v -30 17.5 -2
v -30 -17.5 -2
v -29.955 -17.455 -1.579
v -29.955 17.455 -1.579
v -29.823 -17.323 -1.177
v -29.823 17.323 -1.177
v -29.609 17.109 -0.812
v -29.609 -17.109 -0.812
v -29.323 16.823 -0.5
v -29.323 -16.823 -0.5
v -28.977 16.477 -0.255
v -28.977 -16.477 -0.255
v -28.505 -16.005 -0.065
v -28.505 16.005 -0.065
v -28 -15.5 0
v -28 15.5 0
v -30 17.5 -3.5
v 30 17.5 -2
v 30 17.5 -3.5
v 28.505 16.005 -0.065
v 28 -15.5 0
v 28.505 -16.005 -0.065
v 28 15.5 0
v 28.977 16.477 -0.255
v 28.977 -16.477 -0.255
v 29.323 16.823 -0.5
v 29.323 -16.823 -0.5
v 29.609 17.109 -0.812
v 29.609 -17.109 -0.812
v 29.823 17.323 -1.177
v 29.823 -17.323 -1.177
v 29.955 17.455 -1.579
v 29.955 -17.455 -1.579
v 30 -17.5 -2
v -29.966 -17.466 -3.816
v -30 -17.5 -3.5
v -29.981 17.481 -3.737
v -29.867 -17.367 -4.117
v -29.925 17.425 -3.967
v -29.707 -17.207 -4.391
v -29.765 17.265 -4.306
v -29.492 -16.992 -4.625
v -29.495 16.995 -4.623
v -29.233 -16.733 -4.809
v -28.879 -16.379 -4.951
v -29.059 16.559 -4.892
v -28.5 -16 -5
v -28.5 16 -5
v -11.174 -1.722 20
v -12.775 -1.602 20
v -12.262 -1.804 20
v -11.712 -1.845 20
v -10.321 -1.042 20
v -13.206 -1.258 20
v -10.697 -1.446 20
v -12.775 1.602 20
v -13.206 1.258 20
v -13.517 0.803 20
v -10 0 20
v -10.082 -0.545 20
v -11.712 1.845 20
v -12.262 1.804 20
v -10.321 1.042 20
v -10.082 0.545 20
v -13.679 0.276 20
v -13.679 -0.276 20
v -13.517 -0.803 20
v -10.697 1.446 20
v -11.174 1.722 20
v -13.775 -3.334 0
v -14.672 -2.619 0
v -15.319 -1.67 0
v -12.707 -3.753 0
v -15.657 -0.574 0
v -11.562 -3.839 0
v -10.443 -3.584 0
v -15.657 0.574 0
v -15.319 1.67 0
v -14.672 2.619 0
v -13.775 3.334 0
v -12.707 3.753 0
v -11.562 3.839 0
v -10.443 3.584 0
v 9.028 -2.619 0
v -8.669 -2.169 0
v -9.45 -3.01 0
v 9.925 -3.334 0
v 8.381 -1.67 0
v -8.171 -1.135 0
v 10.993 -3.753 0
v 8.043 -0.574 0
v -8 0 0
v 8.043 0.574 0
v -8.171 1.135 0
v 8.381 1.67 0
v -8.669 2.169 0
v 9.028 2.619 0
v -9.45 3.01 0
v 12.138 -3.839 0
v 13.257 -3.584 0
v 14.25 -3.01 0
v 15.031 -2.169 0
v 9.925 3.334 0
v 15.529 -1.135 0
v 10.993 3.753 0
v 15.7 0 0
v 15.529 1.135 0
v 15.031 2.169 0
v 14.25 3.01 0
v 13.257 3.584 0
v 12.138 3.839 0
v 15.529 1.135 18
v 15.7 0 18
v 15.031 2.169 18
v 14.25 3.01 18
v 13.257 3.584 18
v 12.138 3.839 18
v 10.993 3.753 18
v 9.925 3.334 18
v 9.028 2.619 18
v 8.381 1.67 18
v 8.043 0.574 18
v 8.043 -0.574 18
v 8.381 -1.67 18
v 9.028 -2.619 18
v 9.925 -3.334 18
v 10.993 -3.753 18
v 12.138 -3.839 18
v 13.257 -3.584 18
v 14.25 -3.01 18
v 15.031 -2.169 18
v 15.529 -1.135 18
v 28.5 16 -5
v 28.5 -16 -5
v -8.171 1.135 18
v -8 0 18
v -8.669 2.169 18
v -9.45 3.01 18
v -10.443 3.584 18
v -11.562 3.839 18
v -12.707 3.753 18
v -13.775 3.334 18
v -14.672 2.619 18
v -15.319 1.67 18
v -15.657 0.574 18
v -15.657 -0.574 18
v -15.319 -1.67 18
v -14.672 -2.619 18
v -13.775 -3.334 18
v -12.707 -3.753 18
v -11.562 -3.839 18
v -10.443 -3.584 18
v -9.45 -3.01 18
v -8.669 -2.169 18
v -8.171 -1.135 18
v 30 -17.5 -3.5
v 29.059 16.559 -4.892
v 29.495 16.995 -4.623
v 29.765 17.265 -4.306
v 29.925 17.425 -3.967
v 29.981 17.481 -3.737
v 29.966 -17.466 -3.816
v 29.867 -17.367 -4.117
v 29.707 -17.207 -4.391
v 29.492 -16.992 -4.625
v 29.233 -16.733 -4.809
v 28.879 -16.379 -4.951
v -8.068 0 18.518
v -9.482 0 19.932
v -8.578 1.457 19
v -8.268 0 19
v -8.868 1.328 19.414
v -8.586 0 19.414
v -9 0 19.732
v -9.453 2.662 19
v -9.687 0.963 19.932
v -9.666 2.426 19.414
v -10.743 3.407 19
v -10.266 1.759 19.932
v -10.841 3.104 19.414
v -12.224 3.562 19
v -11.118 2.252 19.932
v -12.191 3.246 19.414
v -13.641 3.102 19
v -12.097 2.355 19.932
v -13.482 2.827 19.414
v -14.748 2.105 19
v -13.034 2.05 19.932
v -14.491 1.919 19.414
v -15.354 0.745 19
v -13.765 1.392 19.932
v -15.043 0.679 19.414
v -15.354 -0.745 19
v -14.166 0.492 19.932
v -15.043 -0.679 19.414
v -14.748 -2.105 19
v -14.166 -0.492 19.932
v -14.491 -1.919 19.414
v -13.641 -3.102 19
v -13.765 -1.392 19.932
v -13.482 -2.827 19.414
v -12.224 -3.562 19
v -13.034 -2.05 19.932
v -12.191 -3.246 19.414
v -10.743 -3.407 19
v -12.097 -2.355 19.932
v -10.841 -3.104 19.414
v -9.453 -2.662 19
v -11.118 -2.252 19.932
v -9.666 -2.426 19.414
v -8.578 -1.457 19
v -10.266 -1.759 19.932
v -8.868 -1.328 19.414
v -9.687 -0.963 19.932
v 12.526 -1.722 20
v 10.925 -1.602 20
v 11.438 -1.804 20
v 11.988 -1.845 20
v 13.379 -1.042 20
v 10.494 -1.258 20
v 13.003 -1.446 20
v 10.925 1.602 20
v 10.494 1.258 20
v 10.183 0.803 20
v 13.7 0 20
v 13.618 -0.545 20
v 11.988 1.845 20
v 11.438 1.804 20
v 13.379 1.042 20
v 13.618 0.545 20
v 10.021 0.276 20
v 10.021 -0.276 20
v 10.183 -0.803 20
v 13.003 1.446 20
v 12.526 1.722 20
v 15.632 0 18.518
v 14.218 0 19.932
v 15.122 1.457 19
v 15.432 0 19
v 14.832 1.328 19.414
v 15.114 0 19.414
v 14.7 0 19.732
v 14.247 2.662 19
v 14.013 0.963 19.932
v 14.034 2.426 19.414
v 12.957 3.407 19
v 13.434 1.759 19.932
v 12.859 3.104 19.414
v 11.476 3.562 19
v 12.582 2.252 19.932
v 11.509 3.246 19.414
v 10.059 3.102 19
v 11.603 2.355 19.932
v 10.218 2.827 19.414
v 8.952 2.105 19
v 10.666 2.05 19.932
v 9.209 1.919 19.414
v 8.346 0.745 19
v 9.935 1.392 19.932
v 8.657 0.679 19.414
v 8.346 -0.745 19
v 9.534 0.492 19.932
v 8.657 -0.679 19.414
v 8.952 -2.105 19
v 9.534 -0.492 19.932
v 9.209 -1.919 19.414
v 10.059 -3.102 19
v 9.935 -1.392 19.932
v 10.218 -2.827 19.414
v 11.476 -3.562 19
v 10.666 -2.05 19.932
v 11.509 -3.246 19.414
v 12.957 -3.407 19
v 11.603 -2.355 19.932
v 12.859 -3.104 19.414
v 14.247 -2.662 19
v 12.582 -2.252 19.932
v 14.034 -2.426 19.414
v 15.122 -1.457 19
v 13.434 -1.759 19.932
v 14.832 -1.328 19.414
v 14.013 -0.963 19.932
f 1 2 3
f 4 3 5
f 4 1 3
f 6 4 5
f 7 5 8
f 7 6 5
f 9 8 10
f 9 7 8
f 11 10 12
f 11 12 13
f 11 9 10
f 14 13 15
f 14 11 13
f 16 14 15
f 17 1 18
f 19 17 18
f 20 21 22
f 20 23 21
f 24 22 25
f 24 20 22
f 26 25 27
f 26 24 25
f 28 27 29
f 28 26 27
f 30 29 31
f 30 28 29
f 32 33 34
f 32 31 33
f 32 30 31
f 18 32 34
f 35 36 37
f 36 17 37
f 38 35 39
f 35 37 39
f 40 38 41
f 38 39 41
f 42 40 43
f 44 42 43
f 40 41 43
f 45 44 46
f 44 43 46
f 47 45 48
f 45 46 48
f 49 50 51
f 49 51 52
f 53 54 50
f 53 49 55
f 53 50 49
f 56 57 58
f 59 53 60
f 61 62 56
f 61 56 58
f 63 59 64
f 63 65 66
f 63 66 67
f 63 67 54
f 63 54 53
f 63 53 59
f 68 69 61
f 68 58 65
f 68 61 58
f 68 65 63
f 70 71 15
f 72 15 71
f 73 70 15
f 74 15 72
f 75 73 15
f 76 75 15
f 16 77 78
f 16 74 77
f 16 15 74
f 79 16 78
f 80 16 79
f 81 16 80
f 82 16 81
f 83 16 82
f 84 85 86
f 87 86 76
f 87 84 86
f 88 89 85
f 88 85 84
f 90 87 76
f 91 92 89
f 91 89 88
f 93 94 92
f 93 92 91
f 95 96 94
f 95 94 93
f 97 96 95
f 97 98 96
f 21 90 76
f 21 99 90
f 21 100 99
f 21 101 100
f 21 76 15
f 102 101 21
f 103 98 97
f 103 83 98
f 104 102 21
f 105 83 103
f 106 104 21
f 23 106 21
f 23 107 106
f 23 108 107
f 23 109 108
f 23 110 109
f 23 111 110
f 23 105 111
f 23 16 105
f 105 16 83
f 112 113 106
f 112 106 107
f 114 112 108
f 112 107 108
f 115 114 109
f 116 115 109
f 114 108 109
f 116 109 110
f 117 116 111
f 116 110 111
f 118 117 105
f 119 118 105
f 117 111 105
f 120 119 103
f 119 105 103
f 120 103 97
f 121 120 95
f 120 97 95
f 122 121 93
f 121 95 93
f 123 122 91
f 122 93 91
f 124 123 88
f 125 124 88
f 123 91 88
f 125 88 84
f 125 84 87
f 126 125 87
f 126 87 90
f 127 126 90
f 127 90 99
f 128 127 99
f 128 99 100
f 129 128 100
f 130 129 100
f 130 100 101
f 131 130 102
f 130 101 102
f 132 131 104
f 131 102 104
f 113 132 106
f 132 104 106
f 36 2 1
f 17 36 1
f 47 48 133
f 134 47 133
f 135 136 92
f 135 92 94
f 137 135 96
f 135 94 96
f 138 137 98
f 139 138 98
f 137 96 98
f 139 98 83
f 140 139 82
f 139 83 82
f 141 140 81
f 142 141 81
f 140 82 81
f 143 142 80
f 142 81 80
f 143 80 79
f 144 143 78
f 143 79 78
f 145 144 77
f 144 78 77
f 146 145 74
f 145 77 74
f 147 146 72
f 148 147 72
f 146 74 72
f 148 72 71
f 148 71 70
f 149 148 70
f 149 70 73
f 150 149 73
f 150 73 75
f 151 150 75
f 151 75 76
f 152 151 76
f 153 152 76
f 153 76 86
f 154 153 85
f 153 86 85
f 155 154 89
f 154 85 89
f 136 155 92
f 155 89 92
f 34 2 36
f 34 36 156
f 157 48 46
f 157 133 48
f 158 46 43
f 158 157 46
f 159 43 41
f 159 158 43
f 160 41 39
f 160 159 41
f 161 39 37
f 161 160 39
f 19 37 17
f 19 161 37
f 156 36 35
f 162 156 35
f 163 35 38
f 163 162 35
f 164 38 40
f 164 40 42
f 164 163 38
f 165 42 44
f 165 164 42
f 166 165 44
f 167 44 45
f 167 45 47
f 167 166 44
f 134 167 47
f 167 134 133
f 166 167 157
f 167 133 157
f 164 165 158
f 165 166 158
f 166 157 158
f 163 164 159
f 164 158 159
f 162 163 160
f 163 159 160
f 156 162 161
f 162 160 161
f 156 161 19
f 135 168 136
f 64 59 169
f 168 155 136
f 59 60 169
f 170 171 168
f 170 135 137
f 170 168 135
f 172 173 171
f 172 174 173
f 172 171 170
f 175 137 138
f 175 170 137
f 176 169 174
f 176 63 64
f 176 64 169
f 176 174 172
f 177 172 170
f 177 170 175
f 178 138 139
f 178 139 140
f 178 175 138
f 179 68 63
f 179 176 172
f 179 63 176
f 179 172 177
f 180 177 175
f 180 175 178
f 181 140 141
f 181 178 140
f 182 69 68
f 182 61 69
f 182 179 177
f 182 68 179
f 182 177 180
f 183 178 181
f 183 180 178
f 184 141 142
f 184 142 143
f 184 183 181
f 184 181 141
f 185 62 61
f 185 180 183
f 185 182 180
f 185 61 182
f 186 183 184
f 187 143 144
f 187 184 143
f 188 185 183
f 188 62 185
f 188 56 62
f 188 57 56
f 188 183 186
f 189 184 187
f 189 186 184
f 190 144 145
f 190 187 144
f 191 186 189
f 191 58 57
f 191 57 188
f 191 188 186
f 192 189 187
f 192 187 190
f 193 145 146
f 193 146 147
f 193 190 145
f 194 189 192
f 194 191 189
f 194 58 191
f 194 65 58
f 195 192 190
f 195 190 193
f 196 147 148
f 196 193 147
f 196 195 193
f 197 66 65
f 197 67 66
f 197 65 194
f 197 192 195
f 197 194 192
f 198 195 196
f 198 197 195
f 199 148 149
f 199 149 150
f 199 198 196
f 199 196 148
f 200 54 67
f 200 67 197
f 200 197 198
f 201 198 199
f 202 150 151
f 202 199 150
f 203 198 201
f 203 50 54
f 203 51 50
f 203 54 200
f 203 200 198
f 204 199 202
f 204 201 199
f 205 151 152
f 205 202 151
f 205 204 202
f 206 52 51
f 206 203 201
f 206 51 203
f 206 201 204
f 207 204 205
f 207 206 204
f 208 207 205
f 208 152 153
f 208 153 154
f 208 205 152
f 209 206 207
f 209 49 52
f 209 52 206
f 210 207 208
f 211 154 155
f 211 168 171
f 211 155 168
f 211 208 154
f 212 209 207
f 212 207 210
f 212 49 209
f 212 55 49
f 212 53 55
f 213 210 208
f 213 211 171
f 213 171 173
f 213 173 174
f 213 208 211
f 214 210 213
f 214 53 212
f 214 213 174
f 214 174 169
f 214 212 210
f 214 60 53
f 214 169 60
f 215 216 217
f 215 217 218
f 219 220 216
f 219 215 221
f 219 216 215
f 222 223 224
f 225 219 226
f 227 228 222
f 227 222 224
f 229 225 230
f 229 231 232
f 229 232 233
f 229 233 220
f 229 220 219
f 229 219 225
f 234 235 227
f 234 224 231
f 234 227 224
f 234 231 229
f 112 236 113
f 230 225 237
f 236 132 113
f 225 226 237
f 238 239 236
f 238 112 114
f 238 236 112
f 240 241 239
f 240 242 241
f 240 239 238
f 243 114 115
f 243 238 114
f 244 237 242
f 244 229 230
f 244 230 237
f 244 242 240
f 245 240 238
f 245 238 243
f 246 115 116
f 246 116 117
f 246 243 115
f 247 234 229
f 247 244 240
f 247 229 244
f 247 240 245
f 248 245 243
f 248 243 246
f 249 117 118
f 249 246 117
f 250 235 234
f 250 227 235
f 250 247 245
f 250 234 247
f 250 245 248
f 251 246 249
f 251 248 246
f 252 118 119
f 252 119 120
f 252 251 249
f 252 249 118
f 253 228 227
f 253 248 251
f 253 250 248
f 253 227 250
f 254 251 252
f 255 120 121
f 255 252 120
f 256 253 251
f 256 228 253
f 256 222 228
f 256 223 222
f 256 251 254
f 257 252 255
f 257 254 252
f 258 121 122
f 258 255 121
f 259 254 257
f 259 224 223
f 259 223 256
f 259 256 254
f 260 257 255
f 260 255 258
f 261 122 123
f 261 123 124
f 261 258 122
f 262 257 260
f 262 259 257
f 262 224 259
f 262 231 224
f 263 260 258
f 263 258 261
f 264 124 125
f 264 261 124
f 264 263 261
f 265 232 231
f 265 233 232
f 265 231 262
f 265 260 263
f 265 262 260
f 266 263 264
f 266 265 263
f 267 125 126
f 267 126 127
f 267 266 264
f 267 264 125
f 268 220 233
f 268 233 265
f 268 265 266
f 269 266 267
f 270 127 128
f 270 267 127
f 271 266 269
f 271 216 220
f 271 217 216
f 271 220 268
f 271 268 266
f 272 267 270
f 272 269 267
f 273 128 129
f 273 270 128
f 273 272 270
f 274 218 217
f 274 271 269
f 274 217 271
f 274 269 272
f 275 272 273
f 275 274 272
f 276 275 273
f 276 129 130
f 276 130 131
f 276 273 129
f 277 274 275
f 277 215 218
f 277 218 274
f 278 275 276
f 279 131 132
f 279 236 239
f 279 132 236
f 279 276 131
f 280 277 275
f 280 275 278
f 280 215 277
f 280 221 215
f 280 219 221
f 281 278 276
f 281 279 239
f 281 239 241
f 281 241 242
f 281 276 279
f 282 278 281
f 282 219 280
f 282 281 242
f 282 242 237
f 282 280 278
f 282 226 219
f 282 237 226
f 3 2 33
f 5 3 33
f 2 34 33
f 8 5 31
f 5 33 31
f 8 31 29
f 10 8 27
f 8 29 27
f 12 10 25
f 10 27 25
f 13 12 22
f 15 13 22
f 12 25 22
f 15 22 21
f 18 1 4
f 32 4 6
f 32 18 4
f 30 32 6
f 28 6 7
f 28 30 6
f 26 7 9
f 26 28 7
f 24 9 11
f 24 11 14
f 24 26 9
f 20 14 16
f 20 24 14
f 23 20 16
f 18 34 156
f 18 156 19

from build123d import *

# Parameters (mm, degrees)
F0_W     = 60
F0_H     = 35
F1_DEPTH = 5
F2_R     = 3.85
F3_DEPTH = 20
F4_R     = 2
F5_R     = 1.5


with BuildPart() as f1:
    # F0 (on Top) → F1 (new body)
    with BuildSketch(Plane.XY):
        Rectangle(F0_W, F0_H)
    extrude(amount=-F1_DEPTH)

    # F2 (on Top) → F3 (join)
    with BuildSketch(Plane.XY):
        with Locations((11.85, 0)):
            Circle(F2_R)
        with Locations((-11.85, 0)):
            Circle(F2_R)
    extrude(amount=F3_DEPTH)

    # F4
    f4_edges = [f1.edges().sort_by_distance(p)[0] for p in [
        (0, -17.5, 0),
        (-30, 0, 0),
        (0, 17.5, 0),
        (30, 0, 0),
        (8, 0, 20),
        (-15.7, 0, 20),
    ]]
    fillet(f4_edges, radius=F4_R)

    # F5
    f5_edges = [f1.edges().sort_by_distance(p)[0] for p in [
        (0, 17.5, -5),
        (-30, 0, -5),
        (0, -17.5, -5),
        (30, 0, -5),
    ]]
    fillet(f5_edges, radius=F5_R)


solid = f1.part
